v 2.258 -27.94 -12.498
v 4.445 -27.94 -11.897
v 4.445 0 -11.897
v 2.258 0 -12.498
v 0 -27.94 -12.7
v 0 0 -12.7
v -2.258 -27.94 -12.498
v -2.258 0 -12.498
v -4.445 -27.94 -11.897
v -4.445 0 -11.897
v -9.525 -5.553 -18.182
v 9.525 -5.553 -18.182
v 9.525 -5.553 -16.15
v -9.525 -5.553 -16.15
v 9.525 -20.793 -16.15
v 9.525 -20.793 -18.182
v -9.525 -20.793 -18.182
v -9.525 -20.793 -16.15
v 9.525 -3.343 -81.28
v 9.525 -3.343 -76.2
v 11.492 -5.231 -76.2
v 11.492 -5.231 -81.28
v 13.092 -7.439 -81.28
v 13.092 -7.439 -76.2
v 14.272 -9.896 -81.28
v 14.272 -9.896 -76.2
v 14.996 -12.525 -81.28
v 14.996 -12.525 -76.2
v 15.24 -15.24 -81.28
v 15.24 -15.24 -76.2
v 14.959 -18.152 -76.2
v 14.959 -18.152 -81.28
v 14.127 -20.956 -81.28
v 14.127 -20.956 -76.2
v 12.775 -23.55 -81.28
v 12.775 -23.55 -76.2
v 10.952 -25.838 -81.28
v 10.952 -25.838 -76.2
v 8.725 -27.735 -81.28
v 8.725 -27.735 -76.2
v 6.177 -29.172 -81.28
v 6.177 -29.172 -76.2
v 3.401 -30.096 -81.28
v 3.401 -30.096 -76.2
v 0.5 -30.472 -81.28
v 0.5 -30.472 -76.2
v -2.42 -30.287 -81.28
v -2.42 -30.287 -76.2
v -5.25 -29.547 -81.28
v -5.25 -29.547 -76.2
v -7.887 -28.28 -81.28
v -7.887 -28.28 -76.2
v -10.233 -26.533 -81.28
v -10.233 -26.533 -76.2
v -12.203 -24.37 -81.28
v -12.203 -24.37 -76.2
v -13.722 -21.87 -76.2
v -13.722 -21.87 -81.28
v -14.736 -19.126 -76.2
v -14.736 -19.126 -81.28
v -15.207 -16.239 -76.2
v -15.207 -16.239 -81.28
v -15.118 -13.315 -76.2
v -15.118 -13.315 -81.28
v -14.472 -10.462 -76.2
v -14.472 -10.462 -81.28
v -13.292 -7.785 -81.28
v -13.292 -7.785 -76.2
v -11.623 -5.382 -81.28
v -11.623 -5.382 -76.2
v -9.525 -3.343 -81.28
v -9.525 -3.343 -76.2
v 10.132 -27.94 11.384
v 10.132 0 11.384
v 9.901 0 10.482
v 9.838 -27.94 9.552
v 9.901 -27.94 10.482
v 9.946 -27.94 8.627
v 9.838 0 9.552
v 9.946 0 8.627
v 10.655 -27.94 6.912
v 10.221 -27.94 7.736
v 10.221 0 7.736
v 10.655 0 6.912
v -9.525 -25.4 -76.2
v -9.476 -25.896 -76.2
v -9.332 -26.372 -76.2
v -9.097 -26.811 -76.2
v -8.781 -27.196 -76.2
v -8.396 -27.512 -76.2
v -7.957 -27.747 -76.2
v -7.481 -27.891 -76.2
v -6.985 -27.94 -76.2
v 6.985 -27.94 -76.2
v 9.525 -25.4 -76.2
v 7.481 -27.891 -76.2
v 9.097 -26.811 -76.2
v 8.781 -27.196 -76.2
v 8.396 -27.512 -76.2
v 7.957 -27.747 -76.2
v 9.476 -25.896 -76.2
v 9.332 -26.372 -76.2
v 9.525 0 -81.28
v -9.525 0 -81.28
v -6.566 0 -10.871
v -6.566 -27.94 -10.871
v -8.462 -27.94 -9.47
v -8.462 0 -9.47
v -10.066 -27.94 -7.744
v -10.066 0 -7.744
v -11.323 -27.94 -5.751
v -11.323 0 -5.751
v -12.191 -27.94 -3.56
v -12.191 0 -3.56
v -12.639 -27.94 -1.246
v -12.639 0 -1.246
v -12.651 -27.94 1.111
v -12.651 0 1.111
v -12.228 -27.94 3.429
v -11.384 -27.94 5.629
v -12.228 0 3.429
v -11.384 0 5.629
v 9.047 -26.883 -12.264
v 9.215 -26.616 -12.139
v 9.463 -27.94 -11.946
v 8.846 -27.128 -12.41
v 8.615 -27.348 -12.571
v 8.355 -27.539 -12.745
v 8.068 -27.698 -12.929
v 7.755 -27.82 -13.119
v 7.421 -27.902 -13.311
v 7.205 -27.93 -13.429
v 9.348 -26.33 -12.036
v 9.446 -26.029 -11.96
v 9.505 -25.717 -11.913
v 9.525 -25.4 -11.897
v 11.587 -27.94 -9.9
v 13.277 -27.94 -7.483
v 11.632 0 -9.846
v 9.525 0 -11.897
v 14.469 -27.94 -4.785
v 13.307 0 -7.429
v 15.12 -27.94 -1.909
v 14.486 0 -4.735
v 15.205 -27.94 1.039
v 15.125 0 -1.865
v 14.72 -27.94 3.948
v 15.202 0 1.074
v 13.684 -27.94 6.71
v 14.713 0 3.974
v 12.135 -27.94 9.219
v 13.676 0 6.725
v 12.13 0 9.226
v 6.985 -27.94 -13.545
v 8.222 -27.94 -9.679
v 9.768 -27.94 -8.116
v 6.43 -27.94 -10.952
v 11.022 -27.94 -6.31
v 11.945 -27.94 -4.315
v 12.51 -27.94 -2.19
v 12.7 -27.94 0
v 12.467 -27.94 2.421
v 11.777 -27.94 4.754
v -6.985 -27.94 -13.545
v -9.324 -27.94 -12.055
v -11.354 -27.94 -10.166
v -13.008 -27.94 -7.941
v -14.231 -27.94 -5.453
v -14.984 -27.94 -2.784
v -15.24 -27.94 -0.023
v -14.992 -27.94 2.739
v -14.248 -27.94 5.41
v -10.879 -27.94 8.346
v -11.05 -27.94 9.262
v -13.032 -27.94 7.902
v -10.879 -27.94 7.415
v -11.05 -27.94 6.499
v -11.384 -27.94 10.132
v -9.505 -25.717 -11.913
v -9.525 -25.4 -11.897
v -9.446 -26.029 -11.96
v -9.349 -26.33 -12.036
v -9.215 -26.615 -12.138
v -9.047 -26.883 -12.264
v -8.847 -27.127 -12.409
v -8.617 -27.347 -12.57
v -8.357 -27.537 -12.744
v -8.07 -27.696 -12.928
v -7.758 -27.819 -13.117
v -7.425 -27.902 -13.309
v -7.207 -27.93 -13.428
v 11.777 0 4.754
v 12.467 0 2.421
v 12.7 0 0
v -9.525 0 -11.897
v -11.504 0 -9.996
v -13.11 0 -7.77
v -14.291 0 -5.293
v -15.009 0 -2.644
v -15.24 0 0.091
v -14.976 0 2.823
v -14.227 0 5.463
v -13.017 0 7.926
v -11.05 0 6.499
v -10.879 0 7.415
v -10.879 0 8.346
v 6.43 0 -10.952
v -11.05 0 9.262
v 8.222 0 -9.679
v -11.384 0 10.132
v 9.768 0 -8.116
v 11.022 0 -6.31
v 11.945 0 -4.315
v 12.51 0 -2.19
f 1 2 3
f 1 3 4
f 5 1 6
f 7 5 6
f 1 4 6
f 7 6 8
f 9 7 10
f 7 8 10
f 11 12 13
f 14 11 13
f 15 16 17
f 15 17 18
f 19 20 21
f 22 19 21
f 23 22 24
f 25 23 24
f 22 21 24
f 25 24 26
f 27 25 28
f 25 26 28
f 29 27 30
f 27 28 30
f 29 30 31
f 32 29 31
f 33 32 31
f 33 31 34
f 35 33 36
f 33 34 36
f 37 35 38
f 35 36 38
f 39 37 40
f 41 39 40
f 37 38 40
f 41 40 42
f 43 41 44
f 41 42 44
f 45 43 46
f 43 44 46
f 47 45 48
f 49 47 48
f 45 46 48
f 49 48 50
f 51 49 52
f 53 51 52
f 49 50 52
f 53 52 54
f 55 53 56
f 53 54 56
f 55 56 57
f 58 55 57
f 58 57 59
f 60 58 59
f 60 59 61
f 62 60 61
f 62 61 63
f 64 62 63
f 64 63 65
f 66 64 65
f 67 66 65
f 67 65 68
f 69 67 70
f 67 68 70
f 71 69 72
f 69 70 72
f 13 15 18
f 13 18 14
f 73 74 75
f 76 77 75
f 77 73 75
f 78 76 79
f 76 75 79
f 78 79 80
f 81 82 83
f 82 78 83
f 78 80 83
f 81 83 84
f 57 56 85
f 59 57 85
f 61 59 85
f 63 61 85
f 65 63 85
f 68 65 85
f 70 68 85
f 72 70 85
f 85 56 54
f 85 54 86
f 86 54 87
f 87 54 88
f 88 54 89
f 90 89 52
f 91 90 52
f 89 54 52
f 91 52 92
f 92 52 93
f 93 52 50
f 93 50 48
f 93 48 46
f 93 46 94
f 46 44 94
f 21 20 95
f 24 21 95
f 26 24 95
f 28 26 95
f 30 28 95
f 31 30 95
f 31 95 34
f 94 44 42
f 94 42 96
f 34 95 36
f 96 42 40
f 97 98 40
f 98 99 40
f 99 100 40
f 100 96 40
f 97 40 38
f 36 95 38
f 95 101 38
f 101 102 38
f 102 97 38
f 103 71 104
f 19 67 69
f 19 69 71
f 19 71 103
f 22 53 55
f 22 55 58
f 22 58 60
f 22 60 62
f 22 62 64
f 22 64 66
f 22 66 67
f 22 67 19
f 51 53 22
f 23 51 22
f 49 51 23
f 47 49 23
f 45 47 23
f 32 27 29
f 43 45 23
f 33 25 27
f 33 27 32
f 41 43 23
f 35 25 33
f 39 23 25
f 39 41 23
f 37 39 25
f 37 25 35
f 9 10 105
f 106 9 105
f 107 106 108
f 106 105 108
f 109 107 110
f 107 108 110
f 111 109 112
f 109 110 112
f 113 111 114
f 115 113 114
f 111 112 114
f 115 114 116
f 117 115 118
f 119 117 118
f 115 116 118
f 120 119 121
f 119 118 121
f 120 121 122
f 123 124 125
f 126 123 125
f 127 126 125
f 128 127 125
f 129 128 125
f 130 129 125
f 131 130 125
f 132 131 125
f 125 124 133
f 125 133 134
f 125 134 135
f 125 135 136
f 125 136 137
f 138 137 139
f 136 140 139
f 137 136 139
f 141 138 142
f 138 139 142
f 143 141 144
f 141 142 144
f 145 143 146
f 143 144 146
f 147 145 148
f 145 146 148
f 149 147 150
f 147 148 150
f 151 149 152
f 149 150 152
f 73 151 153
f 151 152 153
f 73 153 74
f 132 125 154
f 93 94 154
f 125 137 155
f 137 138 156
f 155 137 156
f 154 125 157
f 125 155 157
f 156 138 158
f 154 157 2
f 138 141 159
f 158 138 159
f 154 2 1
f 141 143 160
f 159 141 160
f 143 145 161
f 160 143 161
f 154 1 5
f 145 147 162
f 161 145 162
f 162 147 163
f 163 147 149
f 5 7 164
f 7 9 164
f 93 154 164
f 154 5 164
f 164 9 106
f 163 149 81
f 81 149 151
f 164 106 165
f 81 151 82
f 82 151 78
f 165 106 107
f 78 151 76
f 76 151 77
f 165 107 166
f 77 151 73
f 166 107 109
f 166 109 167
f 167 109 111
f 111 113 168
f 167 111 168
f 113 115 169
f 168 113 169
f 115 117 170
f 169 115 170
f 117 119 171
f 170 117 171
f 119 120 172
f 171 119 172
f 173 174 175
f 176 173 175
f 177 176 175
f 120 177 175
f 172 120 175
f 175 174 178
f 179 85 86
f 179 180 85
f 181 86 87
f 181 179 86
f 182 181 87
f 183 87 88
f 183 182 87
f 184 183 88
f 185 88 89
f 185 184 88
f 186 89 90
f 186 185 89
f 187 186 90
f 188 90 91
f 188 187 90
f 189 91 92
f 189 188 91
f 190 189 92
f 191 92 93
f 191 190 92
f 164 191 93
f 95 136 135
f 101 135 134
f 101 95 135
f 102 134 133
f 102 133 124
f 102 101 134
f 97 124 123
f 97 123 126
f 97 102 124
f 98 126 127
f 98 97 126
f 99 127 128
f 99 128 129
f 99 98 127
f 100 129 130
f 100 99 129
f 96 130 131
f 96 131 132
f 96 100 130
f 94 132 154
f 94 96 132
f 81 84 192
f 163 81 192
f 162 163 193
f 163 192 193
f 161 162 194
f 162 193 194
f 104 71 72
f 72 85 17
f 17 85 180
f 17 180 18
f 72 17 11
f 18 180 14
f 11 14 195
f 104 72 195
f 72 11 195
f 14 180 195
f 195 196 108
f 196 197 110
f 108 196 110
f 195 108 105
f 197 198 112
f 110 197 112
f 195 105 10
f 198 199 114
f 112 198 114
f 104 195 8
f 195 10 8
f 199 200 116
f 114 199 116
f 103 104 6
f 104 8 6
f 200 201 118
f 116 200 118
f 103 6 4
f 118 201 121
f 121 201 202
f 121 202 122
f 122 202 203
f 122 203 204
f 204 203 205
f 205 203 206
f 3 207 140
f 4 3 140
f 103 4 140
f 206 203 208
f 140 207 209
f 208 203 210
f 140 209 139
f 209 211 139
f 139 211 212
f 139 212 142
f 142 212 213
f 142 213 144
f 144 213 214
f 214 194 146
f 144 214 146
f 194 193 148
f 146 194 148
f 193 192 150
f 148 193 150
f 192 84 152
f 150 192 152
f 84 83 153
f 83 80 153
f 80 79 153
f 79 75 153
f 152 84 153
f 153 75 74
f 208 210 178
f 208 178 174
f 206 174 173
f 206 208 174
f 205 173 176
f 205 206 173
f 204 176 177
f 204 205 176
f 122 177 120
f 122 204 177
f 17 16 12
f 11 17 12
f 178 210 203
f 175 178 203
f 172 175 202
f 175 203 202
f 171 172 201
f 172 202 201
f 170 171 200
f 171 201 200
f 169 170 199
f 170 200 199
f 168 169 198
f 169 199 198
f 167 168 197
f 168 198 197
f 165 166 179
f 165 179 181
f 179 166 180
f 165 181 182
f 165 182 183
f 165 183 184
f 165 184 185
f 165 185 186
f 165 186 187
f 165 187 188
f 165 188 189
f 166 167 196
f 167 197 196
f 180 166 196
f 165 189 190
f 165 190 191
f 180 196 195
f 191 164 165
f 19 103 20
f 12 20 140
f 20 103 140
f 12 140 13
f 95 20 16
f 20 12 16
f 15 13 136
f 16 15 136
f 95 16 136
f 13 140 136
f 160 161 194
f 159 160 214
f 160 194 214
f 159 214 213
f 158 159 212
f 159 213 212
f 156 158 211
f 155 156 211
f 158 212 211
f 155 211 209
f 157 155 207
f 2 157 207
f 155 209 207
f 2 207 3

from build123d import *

# Parameters (mm, degrees)
F1_DEPTH    = 27.94
F3_DEPTH    = 50.8
F4_T1_DEPTH = 44.9110888614
F5_R        = 2.54
F6_W        = 15.24
F6_H        = 2.032
F7_DEPTH    = 25.4
F9_DEPTH    = 5.08
F10_DEPTH   = 5.08


# Not quite as in the source:
# - a fillet or chamfer that OpenCascade refuses, or shapes differently, is made with other operations: its cross-section is extruded or revolved along the edge and cut away or added


with BuildPart() as f1:
    # F0 (on Front) → F1 (new body)
    with BuildSketch(Plane.XZ):
        with BuildLine():
            ThreePointArc((-4.445, -11.8967211869), (-12.3269517561, -3.0555294801), (-9.4867838955, 8.4433957221))
            Line((-9.4867838955, 8.4433957221), (-11.3841406746, 10.1320748666))
            ThreePointArc((-11.3841406746, 10.1320748666), (-15.1860134607, -1.281637691), (-9.525, -11.8967211869))
            Line((-9.525, -11.8967211869), (-4.445, -11.8967211869))
        make_face()
        with BuildLine():
            Line((9.525, -11.8967211869), (4.445, -11.8967211869))
            ThreePointArc((4.445, -11.8967211869), (0, -12.7), (-4.445, -11.8967211869))
            Line((-4.445, -11.8967211869), (-9.525, -11.8967211869))
            ThreePointArc((-9.525, -11.8967211869), (0, -15.24), (9.525, -11.8967211869))
        make_face()
        with BuildLine():
            Line((9.525, -25.4), (9.525, -11.8967211869))
            ThreePointArc((9.525, -11.8967211869), (0, -15.24), (-9.525, -11.8967211869))
            Line((-9.525, -11.8967211869), (-9.525, -25.4))
            Line((-9.525, -25.4), (9.525, -25.4))
        make_face()
        with BuildLine():
            ThreePointArc((8.4433957221, 9.4867838955), (11.5870860373, 5.1989842435), (12.7, 0))
            ThreePointArc((12.7, 0), (10.4341147205, -7.2401139494), (4.445, -11.8967211869))
            Line((4.445, -11.8967211869), (9.525, -11.8967211869))
            ThreePointArc((9.525, -11.8967211869), (13.7371503595, -6.5991135768), (15.24, 0))
            ThreePointArc((15.24, 0), (13.9045032448, 6.2387810922), (10.1320748666, 11.3841406746))
            Line((10.1320748666, 11.3841406746), (8.4433957221, 9.4867838955))
        make_face()
    extrude(amount=F1_DEPTH)

    # F2 (on face) → F3 (join)
    with BuildSketch(Plane(origin=(0, 0, -25.4), x_dir=(1, 0, 0), z_dir=(0, 0, -1))):
        with BuildLine():
            Line((-9.525, 0), (-4.2597094971, 0))
            ThreePointArc((-4.2597094971, 0), (-7.0430625309, 1.175419304), (-9.525, 2.8983966834))
            Line((-9.525, 2.8983966834), (-9.525, 0))
        make_face()
        with BuildLine():
            Line((9.525, 2.8983966834), (9.525, 25.0416033166))
            ThreePointArc((9.525, 25.0416033166), (7.0430625309, 26.764580696), (4.2597094971, 27.94))
            Line((4.2597094971, 27.94), (-4.2597094971, 27.94))
            ThreePointArc((-4.2597094971, 27.94), (-7.0430625309, 26.764580696), (-9.525, 25.0416033166))
            Line((-9.525, 25.0416033166), (-9.525, 2.8983966834))
            ThreePointArc((-9.525, 2.8983966834), (-7.0430625309, 1.175419304), (-4.2597094971, 0))
            Line((-4.2597094971, 0), (4.2597094971, 0))
            ThreePointArc((4.2597094971, 0), (7.0430625309, 1.175419304), (9.525, 2.8983966834))
        make_face()
        with BuildLine():
            Line((9.525, 0), (9.525, 2.8983966834))
            ThreePointArc((9.525, 2.8983966834), (7.0430625309, 1.175419304), (4.2597094971, 0))
            Line((4.2597094971, 0), (9.525, 0))
        make_face()
        with BuildLine():
            ThreePointArc((-9.525, 25.0416033166), (-7.0430625309, 26.764580696), (-4.2597094971, 27.94))
            Line((-4.2597094971, 27.94), (-9.525, 27.94))
            Line((-9.525, 27.94), (-9.525, 25.0416033166))
        make_face()
        with BuildLine():
            ThreePointArc((4.2597094971, 27.94), (7.0430625309, 26.764580696), (9.525, 25.0416033166))
            Line((9.525, 25.0416033166), (9.525, 27.94))
            Line((9.525, 27.94), (4.2597094971, 27.94))
        make_face()
    extrude(amount=F3_DEPTH)

    # F4: fillet of radius 5.08 on 2 edges, made by hand

    # F4_s2 → F4_t1 (cut)
    with BuildSketch(Plane.XZ.offset(-8.4855444307)):
        with BuildLine():
            ThreePointArc((-11.3841406746, 10.1320748666), (-10.8580531921, 7.8805841193), (-11.3843237056, 5.6291361473))
            ThreePointArc((-11.3843237056, 5.6291361473), (-10.5299951264, 7.0999438475), (-9.4867838955, 8.4433957221))
            Line((-9.4867838955, 8.4433957221), (-11.3841406746, 10.1320748666))
        make_face()
        with BuildLine():
            ThreePointArc((10.1320748666, 11.3841406746), (9.8706902669, 9.0868255644), (10.6545556025, 6.9116166642))
            ThreePointArc((10.6545556025, 6.9116166642), (9.6353934931, 8.2734026998), (8.4433957221, 9.4867838955))
            Line((8.4433957221, 9.4867838955), (10.1320748666, 11.3841406746))
        make_face()
    extrude(amount=F4_T1_DEPTH, mode=Mode.SUBTRACT)

    # F5
    f5_edges = [f1.edges().sort_by_distance(p)[0] for p in [
        (-9.525, -27.94, -44.048361),
        (9.525, -27.94, -44.048361),
    ]]
    fillet(f5_edges, radius=F5_R)

    # F6 (on face) → F7 (cut)
    with BuildSketch(Plane.YZ.offset(9.525)):
        with Locations((-13.1727202785, -17.1660094585)):
            Rectangle(F6_W, F6_H)
    extrude(amount=-F7_DEPTH, mode=Mode.SUBTRACT)

    # F8 (on face) → F9 (join)
    with BuildSketch(Plane(origin=(0, 0, -76.2), x_dir=(1, 0, 0), z_dir=(0, 0, -1))):
        with BuildLine():
            ThreePointArc((9.525, 3.3432788131), (13.7371503595, 8.6408864232), (15.24, 15.24))
            ThreePointArc((15.24, 15.24), (-6.5991135768, 28.9771503595), (-9.525, 3.3432788131))
            Line((-9.525, 3.3432788131), (-9.525, 25.4))
            ThreePointArc((-9.525, 25.4), (-8.7810512242, 27.1960512242), (-6.985, 27.94))
            Line((-6.985, 27.94), (6.985, 27.94))
            ThreePointArc((6.985, 27.94), (8.7810512242, 27.1960512242), (9.525, 25.4))
            Line((9.525, 25.4), (9.525, 3.3432788131))
        make_face()
        with BuildLine():
            Line((-9.525, 25.4), (-9.525, 3.3432788131))
            ThreePointArc((-9.525, 3.3432788131), (-5.0473542134, 0.8600898666), (0, 0))
            ThreePointArc((0, 0), (5.0473542134, 0.8600898666), (9.525, 3.3432788131))
            Line((9.525, 3.3432788131), (9.525, 25.4))
            ThreePointArc((9.525, 25.4), (8.7810512242, 27.1960512242), (6.985, 27.94))
            Line((6.985, 27.94), (-6.985, 27.94))
            ThreePointArc((-6.985, 27.94), (-8.7810512242, 27.1960512242), (-9.525, 25.4))
        make_face()
    extrude(amount=F9_DEPTH)

    # F10 (add): faces of the model
    f10_faces = [f1.faces().sort_by_distance(p)[0] for p in [
        (-7.1991537336, -0.9808264472, -76.2),
        (7.1991537336, -0.9808264472, -76.2),
    ]]
    extrude(f10_faces, amount=F10_DEPTH)


solid = f1.part
